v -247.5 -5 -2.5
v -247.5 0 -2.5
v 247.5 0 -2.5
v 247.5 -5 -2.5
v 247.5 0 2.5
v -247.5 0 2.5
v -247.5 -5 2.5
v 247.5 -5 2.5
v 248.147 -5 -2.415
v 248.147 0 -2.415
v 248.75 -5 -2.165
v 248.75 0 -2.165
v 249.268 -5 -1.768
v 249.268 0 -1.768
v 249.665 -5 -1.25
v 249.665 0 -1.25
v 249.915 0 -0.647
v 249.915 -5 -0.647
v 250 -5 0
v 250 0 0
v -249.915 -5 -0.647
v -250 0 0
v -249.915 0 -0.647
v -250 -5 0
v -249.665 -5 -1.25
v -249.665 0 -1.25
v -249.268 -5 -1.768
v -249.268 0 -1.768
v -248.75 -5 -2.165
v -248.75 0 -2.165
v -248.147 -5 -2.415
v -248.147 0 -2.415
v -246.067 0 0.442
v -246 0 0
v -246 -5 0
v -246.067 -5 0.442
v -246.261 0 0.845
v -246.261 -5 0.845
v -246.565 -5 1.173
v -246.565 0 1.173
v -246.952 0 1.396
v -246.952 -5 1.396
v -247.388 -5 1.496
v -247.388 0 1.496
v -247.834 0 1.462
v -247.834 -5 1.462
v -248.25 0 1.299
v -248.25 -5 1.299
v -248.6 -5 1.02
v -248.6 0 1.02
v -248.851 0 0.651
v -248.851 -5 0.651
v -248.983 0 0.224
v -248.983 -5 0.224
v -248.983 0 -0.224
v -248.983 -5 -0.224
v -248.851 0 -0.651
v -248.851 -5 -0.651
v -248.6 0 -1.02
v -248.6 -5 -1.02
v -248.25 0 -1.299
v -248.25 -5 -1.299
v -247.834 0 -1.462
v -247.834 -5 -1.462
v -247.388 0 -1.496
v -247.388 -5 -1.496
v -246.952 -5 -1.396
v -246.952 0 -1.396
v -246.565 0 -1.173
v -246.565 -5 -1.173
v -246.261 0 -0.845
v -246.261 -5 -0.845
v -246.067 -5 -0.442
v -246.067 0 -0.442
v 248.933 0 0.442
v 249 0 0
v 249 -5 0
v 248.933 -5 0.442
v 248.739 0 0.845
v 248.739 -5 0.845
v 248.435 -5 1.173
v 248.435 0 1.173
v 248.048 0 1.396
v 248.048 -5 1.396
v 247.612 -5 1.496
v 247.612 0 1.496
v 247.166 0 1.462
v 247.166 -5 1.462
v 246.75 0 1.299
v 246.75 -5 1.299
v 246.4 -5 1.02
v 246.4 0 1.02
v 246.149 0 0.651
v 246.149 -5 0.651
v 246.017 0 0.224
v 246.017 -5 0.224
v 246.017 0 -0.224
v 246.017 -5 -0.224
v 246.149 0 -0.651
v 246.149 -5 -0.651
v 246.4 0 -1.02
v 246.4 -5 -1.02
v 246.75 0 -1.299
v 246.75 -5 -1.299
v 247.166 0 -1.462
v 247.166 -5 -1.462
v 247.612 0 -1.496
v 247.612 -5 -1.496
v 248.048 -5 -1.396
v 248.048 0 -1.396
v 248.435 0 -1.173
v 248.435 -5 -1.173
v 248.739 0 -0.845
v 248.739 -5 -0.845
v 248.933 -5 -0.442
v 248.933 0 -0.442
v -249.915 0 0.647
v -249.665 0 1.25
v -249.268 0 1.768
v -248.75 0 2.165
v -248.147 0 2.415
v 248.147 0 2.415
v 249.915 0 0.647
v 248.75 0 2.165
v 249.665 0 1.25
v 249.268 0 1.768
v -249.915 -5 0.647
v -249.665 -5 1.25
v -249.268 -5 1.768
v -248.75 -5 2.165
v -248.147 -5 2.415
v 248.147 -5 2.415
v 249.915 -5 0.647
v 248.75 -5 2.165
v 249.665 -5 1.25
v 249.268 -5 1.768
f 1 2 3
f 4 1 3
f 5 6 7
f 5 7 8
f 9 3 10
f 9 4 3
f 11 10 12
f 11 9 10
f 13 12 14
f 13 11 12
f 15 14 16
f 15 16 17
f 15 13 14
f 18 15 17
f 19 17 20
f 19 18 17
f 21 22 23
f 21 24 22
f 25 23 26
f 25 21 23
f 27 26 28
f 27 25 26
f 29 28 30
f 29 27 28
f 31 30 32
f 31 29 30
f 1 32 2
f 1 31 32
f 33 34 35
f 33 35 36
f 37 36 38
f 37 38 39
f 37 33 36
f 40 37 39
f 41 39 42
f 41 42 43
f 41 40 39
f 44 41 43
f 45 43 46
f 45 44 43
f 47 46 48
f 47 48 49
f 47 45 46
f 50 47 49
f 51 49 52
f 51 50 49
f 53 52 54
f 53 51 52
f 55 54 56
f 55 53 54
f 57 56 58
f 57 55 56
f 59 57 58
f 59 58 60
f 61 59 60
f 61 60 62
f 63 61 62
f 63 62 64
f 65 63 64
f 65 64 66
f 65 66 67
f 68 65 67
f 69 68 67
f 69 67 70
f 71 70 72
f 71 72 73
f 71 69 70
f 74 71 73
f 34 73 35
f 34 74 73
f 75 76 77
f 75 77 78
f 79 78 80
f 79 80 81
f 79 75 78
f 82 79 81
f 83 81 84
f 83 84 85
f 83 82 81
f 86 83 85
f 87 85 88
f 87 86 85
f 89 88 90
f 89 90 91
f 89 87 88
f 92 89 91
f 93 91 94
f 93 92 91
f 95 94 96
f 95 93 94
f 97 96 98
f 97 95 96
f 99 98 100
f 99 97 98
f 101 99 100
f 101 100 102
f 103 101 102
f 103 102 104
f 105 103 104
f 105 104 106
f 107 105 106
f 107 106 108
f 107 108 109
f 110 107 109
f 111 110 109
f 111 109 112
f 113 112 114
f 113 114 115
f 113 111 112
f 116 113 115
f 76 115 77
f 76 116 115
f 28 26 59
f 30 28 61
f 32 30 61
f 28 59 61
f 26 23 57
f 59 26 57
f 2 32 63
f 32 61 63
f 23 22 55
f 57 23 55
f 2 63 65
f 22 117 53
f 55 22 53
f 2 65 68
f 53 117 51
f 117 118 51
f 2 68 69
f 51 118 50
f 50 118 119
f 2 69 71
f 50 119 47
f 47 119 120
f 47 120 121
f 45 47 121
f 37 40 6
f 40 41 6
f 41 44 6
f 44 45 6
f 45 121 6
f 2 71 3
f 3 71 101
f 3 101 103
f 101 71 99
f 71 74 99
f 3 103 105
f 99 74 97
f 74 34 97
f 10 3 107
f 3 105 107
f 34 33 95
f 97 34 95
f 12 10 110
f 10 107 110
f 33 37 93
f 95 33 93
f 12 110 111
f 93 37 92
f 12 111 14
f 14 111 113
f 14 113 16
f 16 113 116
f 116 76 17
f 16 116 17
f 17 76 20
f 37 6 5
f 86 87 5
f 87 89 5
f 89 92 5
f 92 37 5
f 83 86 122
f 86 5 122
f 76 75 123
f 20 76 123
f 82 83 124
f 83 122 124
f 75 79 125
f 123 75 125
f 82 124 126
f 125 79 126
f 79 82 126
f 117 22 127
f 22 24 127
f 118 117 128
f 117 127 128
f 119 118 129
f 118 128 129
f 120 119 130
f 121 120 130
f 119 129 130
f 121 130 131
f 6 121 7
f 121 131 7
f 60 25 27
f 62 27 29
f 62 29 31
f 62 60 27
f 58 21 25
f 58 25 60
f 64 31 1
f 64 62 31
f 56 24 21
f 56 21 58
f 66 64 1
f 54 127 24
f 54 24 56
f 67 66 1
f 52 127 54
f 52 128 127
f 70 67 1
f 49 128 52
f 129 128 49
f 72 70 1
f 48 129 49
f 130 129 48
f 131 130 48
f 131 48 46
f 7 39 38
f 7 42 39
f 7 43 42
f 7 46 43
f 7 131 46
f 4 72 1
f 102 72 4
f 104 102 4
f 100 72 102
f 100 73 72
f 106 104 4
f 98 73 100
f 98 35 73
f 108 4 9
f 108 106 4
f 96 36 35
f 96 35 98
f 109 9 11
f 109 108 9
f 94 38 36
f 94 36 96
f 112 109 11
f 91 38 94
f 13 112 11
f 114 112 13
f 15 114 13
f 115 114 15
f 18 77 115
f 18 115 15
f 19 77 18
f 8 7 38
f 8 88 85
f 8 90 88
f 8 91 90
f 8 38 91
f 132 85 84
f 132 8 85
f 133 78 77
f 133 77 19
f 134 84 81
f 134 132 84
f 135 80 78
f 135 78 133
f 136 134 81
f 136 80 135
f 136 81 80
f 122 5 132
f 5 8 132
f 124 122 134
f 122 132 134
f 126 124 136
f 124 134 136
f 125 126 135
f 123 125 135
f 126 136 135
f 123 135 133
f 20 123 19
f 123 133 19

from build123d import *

# Parameters (mm, degrees)
F0_W     = 500
F0_H     = 5
F0_R     = 1.5
F1_DEPTH = 5
F2_R     = 2.49999


# Not quite as in the source:
# - a fillet or chamfer is up to 0.001 mm smaller than in the source, because OpenCascade refuses the exact size


with BuildPart() as f1:
    # F0 (on Front) → F1 (new body)
    with BuildSketch(Plane.XZ):
        Rectangle(F0_W, F0_H)
        with Locations((-247.5, 0)):
            Circle(F0_R, mode=Mode.SUBTRACT)
        with Locations((247.5, 0)):
            Circle(F0_R, mode=Mode.SUBTRACT)
    extrude(amount=F1_DEPTH)

    # F2 (radius 2.5 in the source; OpenCascade refuses exactly that, so slightly less here)
    f2_edges = [f1.edges().sort_by_distance(p)[0] for p in [
        (250, -2.5, 2.5),
        (250, -2.5, -2.5),
        (-250, -2.5, 2.5),
        (-250, -2.5, -2.5),
    ]]
    fillet(f2_edges, radius=F2_R)


solid = f1.part
